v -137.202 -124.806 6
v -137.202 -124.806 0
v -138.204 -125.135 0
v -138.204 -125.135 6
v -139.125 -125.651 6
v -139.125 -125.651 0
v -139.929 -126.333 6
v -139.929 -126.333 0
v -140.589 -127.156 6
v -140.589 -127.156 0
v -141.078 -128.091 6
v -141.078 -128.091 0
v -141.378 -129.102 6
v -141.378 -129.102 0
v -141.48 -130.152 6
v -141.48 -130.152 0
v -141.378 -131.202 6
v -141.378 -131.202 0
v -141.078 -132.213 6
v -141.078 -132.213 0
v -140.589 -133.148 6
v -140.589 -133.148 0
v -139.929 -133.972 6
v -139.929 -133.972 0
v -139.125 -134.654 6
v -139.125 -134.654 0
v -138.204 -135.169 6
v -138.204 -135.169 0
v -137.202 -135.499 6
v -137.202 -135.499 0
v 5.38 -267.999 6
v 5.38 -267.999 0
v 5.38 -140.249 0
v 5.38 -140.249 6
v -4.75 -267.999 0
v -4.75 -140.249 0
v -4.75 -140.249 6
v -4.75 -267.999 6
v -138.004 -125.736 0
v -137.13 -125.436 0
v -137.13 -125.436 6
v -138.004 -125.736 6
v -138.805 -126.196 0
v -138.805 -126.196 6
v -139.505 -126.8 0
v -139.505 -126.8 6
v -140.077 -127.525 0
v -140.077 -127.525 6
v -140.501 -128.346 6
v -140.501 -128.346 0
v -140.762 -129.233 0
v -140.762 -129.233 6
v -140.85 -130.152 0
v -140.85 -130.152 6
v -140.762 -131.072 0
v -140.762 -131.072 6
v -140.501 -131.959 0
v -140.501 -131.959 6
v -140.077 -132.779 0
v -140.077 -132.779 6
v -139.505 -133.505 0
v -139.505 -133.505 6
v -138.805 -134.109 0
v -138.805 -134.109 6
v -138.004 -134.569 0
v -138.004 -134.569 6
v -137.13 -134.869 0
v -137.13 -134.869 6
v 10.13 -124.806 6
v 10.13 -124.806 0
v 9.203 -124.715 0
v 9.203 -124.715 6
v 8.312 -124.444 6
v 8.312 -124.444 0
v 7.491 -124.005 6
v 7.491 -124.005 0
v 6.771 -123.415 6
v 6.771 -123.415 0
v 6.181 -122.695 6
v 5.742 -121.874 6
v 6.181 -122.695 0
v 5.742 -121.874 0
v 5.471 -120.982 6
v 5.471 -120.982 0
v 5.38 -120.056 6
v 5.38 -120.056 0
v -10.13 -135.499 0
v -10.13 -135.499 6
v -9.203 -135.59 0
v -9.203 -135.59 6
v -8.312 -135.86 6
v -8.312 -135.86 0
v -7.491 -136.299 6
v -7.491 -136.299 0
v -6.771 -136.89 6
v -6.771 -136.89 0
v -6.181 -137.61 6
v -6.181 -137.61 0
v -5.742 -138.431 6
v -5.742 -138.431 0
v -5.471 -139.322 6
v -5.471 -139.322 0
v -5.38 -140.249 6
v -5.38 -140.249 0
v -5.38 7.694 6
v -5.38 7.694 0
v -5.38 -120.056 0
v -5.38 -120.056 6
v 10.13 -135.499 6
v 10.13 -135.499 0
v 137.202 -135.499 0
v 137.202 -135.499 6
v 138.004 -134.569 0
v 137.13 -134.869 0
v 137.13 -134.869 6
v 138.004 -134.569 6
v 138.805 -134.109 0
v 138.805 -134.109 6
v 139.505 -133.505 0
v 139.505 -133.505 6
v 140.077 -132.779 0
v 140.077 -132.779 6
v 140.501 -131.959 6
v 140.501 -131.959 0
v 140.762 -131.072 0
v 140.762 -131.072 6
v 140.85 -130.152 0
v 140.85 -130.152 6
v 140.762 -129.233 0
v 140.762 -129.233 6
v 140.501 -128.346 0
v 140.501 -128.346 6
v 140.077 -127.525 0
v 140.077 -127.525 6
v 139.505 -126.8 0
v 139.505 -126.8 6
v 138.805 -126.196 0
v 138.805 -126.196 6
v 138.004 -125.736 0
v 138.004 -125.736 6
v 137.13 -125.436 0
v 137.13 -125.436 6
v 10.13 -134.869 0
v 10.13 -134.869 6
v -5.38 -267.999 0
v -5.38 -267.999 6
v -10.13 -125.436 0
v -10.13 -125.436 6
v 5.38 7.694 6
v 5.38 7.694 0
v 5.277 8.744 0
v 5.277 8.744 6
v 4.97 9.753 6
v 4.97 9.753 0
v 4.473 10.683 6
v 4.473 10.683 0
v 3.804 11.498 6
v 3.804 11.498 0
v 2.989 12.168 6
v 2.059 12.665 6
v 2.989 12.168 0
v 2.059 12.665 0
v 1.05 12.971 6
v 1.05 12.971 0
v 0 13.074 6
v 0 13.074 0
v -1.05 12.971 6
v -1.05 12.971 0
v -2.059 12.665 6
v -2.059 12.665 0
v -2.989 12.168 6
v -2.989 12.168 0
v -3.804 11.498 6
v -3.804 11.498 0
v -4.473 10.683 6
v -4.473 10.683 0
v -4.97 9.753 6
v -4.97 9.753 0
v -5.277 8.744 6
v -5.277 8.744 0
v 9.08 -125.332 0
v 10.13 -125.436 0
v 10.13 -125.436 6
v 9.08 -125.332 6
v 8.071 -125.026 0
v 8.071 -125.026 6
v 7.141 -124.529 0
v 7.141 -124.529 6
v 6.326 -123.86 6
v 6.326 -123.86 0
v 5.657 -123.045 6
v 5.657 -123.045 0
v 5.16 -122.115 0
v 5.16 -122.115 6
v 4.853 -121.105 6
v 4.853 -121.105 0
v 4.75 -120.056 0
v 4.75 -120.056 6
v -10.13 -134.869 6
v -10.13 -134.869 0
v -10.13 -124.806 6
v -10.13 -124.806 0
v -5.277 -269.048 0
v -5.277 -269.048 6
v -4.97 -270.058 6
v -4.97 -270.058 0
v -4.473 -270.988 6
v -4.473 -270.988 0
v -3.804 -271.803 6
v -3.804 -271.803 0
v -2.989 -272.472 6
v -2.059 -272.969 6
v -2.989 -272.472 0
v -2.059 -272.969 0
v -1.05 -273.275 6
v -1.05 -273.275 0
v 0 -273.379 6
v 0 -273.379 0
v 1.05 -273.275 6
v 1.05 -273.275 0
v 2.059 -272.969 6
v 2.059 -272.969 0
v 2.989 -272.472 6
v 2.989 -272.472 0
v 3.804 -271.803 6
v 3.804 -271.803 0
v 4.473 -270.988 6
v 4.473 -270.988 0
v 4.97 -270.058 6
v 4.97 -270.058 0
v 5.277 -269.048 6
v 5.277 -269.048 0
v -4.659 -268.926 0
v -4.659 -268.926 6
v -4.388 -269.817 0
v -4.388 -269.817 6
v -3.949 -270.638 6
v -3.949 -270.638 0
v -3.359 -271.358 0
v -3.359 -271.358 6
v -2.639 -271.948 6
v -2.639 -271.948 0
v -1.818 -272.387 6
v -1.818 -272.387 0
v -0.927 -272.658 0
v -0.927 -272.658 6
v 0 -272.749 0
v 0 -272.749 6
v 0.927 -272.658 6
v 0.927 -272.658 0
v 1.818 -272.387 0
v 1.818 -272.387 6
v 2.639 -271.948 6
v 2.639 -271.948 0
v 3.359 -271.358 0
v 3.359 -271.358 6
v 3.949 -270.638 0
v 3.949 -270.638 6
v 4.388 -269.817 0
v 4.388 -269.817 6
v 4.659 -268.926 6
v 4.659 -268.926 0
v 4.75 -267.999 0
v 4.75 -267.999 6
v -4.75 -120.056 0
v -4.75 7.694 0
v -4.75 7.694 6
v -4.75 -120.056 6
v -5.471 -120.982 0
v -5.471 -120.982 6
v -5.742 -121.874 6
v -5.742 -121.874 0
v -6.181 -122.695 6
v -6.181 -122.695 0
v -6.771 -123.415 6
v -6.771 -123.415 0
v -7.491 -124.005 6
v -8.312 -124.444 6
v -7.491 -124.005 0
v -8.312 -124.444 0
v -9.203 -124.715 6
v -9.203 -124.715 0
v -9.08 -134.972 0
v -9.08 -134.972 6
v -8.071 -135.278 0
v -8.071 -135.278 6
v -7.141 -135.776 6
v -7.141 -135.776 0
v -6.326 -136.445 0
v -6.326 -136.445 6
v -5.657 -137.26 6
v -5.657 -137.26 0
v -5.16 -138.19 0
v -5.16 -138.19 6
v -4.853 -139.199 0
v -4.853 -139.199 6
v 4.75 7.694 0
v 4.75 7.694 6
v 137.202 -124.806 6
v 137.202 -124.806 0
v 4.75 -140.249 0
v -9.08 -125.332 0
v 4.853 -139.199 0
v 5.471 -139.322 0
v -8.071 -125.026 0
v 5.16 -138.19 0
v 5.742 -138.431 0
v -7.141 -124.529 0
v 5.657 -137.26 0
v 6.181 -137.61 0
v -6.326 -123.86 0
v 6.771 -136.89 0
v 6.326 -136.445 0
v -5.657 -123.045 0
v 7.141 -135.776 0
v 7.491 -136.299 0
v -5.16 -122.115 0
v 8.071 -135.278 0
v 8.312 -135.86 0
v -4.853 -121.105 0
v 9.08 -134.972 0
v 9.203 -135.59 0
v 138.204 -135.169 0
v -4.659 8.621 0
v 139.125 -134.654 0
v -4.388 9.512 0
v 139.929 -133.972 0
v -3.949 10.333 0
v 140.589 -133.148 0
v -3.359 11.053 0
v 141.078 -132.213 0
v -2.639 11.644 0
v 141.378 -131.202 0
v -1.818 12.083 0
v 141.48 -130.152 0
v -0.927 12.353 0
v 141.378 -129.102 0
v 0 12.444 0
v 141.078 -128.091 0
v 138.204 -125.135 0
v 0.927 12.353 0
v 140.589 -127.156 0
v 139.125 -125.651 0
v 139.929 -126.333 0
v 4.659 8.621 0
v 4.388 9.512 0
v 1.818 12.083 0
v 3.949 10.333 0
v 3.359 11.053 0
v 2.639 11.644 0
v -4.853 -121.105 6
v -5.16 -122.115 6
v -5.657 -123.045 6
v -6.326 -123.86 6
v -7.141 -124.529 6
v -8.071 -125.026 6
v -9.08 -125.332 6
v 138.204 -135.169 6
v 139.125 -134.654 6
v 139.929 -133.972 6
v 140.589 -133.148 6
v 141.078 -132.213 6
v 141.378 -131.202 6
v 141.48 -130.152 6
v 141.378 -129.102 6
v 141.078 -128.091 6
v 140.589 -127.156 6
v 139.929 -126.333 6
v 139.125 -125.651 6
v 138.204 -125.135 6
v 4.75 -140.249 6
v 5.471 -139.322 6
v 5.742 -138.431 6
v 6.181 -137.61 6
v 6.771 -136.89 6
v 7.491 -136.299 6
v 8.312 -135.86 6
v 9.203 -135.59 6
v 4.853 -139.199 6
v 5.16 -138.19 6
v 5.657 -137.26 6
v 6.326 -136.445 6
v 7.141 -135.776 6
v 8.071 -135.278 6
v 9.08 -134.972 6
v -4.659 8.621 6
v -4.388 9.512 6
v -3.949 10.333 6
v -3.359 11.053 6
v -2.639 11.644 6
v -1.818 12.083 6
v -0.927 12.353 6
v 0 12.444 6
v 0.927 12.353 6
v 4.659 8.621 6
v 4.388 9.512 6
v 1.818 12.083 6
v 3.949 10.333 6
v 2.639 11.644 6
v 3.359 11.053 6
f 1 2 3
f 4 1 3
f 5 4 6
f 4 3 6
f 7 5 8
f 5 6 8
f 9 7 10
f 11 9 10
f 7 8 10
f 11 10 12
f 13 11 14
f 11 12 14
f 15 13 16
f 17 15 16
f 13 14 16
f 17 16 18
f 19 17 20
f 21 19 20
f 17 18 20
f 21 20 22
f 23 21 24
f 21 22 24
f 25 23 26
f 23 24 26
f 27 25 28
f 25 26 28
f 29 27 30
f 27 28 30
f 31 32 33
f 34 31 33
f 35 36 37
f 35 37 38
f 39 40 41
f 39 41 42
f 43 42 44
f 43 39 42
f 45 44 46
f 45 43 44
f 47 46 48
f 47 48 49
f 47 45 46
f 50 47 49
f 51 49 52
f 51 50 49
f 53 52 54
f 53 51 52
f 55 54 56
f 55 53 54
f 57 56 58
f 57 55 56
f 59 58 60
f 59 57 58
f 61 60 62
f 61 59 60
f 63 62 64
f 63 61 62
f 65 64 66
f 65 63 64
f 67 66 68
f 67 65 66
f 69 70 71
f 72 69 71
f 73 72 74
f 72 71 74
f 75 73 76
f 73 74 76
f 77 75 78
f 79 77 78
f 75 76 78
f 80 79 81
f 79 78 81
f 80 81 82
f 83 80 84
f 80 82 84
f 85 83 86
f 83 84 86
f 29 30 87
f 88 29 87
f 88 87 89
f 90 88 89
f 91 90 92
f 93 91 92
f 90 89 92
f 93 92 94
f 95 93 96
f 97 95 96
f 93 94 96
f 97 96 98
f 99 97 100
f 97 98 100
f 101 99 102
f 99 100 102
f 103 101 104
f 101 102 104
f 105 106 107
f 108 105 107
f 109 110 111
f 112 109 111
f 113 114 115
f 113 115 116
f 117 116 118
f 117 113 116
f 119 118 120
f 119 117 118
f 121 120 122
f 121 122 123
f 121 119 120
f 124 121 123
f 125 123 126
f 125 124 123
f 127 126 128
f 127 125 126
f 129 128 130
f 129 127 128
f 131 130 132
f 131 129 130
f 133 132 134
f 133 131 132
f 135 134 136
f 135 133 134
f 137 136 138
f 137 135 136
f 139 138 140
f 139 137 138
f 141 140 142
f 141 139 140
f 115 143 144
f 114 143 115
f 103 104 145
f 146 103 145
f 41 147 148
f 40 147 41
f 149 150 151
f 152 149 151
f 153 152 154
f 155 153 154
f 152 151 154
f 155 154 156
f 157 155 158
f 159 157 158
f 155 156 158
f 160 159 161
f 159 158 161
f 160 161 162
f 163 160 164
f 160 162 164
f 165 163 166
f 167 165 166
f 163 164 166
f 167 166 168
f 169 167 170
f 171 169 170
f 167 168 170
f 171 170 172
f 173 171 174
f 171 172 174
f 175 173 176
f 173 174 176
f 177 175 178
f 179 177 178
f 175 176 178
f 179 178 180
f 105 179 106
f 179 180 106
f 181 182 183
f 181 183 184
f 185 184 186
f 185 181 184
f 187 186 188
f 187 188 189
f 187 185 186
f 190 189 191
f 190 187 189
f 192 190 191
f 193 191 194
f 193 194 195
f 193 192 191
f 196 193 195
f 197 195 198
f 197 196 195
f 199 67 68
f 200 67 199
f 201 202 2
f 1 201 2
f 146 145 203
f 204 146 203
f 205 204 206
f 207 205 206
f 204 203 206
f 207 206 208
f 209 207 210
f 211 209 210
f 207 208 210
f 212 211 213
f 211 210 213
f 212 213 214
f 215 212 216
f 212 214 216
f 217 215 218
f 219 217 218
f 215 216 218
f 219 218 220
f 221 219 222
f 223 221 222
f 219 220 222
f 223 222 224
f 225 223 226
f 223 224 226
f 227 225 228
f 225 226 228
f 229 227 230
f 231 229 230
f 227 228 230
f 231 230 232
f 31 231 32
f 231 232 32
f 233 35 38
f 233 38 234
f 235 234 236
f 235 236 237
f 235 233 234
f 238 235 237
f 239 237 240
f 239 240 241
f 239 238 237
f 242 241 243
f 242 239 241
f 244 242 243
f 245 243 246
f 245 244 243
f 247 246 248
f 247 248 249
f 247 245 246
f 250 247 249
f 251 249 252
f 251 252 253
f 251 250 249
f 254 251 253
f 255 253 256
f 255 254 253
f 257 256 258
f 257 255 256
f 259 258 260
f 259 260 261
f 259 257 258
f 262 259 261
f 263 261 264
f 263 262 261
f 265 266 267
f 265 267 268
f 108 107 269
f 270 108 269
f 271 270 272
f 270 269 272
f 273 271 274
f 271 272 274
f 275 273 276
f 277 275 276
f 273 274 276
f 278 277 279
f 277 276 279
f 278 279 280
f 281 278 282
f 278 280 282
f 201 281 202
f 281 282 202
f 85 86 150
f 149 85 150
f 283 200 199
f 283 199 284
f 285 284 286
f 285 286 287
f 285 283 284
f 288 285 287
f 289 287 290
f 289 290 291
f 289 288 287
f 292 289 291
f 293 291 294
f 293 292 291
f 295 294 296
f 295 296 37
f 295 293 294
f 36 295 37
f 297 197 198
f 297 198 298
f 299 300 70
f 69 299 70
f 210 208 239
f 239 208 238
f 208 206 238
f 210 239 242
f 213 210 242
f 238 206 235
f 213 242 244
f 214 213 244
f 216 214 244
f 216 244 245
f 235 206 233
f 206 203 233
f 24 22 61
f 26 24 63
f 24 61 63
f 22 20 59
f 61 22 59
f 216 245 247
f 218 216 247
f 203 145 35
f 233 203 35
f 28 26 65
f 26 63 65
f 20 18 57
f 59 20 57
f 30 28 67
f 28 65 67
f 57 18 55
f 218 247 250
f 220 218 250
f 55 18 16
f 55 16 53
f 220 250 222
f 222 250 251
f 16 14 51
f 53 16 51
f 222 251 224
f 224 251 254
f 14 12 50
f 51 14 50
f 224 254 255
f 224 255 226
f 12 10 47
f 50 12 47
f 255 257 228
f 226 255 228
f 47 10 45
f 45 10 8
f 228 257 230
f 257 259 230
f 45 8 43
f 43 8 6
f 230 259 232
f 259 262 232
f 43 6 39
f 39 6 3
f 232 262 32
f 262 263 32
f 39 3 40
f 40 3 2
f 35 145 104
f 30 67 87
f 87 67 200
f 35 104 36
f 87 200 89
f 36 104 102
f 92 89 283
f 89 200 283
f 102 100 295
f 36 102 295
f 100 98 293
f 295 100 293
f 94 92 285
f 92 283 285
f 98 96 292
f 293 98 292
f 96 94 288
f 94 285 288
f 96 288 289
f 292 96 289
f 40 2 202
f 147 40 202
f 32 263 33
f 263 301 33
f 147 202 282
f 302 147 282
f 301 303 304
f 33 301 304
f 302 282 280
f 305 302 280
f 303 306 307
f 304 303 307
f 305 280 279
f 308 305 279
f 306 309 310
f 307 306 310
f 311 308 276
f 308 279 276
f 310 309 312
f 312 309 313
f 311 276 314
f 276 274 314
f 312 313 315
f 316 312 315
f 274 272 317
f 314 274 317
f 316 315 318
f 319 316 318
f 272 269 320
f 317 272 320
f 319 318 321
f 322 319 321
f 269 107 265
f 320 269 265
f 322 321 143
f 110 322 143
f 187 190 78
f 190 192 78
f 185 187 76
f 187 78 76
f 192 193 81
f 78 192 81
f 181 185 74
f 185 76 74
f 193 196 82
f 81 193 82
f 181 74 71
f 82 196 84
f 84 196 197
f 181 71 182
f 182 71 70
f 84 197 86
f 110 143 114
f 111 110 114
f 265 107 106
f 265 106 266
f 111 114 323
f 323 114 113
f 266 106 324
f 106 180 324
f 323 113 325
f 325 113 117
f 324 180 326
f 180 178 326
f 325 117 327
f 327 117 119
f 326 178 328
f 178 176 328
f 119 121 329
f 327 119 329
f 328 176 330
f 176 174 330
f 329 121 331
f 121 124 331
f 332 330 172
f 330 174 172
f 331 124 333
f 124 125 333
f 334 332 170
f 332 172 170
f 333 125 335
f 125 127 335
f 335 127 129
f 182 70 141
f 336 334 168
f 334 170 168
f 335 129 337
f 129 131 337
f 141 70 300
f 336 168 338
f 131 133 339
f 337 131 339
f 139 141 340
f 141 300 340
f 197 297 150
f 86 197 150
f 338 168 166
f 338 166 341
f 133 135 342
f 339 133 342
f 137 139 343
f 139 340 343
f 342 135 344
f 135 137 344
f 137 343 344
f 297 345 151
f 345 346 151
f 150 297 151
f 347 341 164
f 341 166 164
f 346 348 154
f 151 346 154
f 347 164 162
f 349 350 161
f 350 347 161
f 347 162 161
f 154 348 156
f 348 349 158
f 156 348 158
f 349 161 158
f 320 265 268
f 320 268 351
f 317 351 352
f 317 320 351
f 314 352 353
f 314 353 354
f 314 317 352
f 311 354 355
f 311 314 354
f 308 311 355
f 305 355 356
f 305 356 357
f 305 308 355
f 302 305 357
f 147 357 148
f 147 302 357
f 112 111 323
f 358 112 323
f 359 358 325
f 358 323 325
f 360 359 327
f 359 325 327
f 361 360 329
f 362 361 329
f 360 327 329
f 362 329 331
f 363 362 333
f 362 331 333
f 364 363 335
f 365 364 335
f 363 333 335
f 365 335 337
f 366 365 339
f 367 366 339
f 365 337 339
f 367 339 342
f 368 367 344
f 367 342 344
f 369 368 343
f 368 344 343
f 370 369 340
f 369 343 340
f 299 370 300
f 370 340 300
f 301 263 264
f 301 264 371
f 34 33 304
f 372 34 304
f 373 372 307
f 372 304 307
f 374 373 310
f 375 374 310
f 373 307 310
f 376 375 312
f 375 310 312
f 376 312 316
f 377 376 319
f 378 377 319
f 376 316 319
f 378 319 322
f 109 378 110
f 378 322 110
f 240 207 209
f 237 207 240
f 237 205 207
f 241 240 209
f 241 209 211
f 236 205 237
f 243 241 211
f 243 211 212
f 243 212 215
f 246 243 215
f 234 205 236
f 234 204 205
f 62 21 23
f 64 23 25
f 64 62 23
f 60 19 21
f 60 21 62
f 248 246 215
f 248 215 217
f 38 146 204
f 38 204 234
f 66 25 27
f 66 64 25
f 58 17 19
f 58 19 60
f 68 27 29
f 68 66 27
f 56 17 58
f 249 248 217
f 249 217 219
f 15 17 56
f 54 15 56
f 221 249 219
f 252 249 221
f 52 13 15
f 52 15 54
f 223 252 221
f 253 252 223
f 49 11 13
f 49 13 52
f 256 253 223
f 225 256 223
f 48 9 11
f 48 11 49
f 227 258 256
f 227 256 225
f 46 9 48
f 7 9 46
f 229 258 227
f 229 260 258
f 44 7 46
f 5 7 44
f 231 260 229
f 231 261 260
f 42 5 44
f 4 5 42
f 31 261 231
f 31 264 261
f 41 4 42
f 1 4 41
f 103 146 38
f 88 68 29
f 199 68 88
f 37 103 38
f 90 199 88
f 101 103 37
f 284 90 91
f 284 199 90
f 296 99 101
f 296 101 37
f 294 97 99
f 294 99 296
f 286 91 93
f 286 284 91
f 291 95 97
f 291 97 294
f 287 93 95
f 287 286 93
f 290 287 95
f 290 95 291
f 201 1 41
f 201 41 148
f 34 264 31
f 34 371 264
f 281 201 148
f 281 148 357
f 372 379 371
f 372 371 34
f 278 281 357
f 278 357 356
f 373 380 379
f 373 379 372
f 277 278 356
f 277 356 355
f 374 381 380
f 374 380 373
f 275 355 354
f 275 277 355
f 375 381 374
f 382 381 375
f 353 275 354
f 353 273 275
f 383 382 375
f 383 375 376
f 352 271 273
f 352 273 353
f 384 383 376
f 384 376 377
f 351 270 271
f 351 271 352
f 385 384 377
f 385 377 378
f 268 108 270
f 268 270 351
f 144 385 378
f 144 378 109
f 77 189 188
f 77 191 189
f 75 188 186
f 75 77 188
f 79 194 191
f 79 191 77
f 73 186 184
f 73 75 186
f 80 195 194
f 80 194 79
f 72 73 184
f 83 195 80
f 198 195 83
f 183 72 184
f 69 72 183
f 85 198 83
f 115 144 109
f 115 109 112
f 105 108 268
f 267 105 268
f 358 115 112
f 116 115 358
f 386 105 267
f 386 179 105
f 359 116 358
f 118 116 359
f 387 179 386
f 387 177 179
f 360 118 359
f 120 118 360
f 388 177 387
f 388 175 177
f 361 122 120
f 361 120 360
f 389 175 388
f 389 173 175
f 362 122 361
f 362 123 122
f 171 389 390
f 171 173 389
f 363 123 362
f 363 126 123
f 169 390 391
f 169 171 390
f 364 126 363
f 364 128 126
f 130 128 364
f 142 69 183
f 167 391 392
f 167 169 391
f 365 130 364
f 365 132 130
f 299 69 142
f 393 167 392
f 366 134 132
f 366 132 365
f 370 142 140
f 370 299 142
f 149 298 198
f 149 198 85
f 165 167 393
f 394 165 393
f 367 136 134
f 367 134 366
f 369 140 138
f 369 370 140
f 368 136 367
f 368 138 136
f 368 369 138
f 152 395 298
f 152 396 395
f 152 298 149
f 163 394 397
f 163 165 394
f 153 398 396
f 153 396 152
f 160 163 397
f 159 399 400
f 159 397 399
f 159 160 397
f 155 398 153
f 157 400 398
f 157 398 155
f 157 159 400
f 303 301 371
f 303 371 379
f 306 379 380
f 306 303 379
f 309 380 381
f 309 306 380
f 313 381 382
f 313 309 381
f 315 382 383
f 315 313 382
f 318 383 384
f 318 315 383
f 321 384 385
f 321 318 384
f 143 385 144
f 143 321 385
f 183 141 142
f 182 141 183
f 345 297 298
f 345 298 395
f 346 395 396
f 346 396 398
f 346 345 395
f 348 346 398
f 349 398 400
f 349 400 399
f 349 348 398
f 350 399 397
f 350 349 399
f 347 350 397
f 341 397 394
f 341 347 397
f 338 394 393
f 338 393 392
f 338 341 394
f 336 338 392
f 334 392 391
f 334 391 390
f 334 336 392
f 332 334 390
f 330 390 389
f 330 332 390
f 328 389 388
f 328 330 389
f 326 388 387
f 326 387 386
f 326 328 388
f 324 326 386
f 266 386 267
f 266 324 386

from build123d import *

# Parameters (mm, degrees)
EXTRUDE_1_DEPTH = 6


with BuildPart() as part:
    # 草图1 → 凸台-拉伸1 (new body)
    with BuildSketch(Plane.XY):
        with BuildLine():
            Line((-5.38, 7.694214332), (-5.38, -120.055785668))
            ThreePointArc((-5.38, -120.055785668), (-6.771242789, -123.414542878), (-10.13, -124.805785668))
            Line((-10.13, -124.805785668), (-137.202114628, -124.805785668))
            ThreePointArc((-137.202114628, -124.805785668), (-141.48, -130.152309812), (-137.202114628, -135.498833956))
            Line((-137.202114628, -135.498833956), (-10.13, -135.498833956))
            ThreePointArc((-10.13, -135.498833956), (-6.771242789, -136.890076745), (-5.38, -140.248833956))
            Line((-5.38, -140.248833956), (-5.38, -267.998833956))
            ThreePointArc((-5.38, -267.998833956), (0, -273.378833956), (5.38, -267.998833956))
            Line((5.38, -267.998833956), (5.38, -140.248833956))
            ThreePointArc((5.38, -140.248833956), (6.771242789, -136.890076745), (10.13, -135.498833956))
            Line((10.13, -135.498833956), (137.202114628, -135.498833956))
            ThreePointArc((137.202114628, -135.498833956), (141.48, -130.152309812), (137.202114628, -124.805785668))
            Line((137.202114628, -124.805785668), (10.13, -124.805785668))
            ThreePointArc((10.13, -124.805785668), (6.771242789, -123.414542878), (5.38, -120.055785668))
            Line((5.38, -120.055785668), (5.38, 7.694214332))
            ThreePointArc((5.38, 7.694214332), (0, 13.074214332), (-5.38, 7.694214332))
        make_face()
        with BuildLine():
            Line((-4.75, 7.694214332), (-4.75, -120.055785668))
            ThreePointArc((-4.75, -120.055785668), (-6.325765517, -123.860020151), (-10.13, -125.435785668))
            Line((-10.13, -125.435785668), (-137.13, -125.435785668))
            ThreePointArc((-137.13, -125.435785668), (-140.85, -130.152309812), (-137.13, -134.868833956))
            Line((-137.13, -134.868833956), (-10.13, -134.868833956))
            ThreePointArc((-10.13, -134.868833956), (-6.325765517, -136.444599473), (-4.75, -140.248833956))
            Line((-4.75, -140.248833956), (-4.75, -267.998833956))
            ThreePointArc((-4.75, -267.998833956), (0, -272.748833956), (4.75, -267.998833956))
            Line((4.75, -267.998833956), (4.75, -140.248833956))
            ThreePointArc((4.75, -140.248833956), (6.325765517, -136.444599473), (10.13, -134.868833956))
            Line((10.13, -134.868833956), (137.13, -134.868833956))
            ThreePointArc((137.13, -134.868833956), (140.85, -130.152309812), (137.13, -125.435785668))
            Line((137.13, -125.435785668), (10.13, -125.435785668))
            ThreePointArc((10.13, -125.435785668), (6.325765517, -123.860020151), (4.75, -120.055785668))
            Line((4.75, -120.055785668), (4.75, 7.694214332))
            ThreePointArc((4.75, 7.694214332), (0, 12.444214332), (-4.75, 7.694214332))
        make_face(mode=Mode.SUBTRACT)
    extrude(amount=EXTRUDE_1_DEPTH)


solid = part.part
